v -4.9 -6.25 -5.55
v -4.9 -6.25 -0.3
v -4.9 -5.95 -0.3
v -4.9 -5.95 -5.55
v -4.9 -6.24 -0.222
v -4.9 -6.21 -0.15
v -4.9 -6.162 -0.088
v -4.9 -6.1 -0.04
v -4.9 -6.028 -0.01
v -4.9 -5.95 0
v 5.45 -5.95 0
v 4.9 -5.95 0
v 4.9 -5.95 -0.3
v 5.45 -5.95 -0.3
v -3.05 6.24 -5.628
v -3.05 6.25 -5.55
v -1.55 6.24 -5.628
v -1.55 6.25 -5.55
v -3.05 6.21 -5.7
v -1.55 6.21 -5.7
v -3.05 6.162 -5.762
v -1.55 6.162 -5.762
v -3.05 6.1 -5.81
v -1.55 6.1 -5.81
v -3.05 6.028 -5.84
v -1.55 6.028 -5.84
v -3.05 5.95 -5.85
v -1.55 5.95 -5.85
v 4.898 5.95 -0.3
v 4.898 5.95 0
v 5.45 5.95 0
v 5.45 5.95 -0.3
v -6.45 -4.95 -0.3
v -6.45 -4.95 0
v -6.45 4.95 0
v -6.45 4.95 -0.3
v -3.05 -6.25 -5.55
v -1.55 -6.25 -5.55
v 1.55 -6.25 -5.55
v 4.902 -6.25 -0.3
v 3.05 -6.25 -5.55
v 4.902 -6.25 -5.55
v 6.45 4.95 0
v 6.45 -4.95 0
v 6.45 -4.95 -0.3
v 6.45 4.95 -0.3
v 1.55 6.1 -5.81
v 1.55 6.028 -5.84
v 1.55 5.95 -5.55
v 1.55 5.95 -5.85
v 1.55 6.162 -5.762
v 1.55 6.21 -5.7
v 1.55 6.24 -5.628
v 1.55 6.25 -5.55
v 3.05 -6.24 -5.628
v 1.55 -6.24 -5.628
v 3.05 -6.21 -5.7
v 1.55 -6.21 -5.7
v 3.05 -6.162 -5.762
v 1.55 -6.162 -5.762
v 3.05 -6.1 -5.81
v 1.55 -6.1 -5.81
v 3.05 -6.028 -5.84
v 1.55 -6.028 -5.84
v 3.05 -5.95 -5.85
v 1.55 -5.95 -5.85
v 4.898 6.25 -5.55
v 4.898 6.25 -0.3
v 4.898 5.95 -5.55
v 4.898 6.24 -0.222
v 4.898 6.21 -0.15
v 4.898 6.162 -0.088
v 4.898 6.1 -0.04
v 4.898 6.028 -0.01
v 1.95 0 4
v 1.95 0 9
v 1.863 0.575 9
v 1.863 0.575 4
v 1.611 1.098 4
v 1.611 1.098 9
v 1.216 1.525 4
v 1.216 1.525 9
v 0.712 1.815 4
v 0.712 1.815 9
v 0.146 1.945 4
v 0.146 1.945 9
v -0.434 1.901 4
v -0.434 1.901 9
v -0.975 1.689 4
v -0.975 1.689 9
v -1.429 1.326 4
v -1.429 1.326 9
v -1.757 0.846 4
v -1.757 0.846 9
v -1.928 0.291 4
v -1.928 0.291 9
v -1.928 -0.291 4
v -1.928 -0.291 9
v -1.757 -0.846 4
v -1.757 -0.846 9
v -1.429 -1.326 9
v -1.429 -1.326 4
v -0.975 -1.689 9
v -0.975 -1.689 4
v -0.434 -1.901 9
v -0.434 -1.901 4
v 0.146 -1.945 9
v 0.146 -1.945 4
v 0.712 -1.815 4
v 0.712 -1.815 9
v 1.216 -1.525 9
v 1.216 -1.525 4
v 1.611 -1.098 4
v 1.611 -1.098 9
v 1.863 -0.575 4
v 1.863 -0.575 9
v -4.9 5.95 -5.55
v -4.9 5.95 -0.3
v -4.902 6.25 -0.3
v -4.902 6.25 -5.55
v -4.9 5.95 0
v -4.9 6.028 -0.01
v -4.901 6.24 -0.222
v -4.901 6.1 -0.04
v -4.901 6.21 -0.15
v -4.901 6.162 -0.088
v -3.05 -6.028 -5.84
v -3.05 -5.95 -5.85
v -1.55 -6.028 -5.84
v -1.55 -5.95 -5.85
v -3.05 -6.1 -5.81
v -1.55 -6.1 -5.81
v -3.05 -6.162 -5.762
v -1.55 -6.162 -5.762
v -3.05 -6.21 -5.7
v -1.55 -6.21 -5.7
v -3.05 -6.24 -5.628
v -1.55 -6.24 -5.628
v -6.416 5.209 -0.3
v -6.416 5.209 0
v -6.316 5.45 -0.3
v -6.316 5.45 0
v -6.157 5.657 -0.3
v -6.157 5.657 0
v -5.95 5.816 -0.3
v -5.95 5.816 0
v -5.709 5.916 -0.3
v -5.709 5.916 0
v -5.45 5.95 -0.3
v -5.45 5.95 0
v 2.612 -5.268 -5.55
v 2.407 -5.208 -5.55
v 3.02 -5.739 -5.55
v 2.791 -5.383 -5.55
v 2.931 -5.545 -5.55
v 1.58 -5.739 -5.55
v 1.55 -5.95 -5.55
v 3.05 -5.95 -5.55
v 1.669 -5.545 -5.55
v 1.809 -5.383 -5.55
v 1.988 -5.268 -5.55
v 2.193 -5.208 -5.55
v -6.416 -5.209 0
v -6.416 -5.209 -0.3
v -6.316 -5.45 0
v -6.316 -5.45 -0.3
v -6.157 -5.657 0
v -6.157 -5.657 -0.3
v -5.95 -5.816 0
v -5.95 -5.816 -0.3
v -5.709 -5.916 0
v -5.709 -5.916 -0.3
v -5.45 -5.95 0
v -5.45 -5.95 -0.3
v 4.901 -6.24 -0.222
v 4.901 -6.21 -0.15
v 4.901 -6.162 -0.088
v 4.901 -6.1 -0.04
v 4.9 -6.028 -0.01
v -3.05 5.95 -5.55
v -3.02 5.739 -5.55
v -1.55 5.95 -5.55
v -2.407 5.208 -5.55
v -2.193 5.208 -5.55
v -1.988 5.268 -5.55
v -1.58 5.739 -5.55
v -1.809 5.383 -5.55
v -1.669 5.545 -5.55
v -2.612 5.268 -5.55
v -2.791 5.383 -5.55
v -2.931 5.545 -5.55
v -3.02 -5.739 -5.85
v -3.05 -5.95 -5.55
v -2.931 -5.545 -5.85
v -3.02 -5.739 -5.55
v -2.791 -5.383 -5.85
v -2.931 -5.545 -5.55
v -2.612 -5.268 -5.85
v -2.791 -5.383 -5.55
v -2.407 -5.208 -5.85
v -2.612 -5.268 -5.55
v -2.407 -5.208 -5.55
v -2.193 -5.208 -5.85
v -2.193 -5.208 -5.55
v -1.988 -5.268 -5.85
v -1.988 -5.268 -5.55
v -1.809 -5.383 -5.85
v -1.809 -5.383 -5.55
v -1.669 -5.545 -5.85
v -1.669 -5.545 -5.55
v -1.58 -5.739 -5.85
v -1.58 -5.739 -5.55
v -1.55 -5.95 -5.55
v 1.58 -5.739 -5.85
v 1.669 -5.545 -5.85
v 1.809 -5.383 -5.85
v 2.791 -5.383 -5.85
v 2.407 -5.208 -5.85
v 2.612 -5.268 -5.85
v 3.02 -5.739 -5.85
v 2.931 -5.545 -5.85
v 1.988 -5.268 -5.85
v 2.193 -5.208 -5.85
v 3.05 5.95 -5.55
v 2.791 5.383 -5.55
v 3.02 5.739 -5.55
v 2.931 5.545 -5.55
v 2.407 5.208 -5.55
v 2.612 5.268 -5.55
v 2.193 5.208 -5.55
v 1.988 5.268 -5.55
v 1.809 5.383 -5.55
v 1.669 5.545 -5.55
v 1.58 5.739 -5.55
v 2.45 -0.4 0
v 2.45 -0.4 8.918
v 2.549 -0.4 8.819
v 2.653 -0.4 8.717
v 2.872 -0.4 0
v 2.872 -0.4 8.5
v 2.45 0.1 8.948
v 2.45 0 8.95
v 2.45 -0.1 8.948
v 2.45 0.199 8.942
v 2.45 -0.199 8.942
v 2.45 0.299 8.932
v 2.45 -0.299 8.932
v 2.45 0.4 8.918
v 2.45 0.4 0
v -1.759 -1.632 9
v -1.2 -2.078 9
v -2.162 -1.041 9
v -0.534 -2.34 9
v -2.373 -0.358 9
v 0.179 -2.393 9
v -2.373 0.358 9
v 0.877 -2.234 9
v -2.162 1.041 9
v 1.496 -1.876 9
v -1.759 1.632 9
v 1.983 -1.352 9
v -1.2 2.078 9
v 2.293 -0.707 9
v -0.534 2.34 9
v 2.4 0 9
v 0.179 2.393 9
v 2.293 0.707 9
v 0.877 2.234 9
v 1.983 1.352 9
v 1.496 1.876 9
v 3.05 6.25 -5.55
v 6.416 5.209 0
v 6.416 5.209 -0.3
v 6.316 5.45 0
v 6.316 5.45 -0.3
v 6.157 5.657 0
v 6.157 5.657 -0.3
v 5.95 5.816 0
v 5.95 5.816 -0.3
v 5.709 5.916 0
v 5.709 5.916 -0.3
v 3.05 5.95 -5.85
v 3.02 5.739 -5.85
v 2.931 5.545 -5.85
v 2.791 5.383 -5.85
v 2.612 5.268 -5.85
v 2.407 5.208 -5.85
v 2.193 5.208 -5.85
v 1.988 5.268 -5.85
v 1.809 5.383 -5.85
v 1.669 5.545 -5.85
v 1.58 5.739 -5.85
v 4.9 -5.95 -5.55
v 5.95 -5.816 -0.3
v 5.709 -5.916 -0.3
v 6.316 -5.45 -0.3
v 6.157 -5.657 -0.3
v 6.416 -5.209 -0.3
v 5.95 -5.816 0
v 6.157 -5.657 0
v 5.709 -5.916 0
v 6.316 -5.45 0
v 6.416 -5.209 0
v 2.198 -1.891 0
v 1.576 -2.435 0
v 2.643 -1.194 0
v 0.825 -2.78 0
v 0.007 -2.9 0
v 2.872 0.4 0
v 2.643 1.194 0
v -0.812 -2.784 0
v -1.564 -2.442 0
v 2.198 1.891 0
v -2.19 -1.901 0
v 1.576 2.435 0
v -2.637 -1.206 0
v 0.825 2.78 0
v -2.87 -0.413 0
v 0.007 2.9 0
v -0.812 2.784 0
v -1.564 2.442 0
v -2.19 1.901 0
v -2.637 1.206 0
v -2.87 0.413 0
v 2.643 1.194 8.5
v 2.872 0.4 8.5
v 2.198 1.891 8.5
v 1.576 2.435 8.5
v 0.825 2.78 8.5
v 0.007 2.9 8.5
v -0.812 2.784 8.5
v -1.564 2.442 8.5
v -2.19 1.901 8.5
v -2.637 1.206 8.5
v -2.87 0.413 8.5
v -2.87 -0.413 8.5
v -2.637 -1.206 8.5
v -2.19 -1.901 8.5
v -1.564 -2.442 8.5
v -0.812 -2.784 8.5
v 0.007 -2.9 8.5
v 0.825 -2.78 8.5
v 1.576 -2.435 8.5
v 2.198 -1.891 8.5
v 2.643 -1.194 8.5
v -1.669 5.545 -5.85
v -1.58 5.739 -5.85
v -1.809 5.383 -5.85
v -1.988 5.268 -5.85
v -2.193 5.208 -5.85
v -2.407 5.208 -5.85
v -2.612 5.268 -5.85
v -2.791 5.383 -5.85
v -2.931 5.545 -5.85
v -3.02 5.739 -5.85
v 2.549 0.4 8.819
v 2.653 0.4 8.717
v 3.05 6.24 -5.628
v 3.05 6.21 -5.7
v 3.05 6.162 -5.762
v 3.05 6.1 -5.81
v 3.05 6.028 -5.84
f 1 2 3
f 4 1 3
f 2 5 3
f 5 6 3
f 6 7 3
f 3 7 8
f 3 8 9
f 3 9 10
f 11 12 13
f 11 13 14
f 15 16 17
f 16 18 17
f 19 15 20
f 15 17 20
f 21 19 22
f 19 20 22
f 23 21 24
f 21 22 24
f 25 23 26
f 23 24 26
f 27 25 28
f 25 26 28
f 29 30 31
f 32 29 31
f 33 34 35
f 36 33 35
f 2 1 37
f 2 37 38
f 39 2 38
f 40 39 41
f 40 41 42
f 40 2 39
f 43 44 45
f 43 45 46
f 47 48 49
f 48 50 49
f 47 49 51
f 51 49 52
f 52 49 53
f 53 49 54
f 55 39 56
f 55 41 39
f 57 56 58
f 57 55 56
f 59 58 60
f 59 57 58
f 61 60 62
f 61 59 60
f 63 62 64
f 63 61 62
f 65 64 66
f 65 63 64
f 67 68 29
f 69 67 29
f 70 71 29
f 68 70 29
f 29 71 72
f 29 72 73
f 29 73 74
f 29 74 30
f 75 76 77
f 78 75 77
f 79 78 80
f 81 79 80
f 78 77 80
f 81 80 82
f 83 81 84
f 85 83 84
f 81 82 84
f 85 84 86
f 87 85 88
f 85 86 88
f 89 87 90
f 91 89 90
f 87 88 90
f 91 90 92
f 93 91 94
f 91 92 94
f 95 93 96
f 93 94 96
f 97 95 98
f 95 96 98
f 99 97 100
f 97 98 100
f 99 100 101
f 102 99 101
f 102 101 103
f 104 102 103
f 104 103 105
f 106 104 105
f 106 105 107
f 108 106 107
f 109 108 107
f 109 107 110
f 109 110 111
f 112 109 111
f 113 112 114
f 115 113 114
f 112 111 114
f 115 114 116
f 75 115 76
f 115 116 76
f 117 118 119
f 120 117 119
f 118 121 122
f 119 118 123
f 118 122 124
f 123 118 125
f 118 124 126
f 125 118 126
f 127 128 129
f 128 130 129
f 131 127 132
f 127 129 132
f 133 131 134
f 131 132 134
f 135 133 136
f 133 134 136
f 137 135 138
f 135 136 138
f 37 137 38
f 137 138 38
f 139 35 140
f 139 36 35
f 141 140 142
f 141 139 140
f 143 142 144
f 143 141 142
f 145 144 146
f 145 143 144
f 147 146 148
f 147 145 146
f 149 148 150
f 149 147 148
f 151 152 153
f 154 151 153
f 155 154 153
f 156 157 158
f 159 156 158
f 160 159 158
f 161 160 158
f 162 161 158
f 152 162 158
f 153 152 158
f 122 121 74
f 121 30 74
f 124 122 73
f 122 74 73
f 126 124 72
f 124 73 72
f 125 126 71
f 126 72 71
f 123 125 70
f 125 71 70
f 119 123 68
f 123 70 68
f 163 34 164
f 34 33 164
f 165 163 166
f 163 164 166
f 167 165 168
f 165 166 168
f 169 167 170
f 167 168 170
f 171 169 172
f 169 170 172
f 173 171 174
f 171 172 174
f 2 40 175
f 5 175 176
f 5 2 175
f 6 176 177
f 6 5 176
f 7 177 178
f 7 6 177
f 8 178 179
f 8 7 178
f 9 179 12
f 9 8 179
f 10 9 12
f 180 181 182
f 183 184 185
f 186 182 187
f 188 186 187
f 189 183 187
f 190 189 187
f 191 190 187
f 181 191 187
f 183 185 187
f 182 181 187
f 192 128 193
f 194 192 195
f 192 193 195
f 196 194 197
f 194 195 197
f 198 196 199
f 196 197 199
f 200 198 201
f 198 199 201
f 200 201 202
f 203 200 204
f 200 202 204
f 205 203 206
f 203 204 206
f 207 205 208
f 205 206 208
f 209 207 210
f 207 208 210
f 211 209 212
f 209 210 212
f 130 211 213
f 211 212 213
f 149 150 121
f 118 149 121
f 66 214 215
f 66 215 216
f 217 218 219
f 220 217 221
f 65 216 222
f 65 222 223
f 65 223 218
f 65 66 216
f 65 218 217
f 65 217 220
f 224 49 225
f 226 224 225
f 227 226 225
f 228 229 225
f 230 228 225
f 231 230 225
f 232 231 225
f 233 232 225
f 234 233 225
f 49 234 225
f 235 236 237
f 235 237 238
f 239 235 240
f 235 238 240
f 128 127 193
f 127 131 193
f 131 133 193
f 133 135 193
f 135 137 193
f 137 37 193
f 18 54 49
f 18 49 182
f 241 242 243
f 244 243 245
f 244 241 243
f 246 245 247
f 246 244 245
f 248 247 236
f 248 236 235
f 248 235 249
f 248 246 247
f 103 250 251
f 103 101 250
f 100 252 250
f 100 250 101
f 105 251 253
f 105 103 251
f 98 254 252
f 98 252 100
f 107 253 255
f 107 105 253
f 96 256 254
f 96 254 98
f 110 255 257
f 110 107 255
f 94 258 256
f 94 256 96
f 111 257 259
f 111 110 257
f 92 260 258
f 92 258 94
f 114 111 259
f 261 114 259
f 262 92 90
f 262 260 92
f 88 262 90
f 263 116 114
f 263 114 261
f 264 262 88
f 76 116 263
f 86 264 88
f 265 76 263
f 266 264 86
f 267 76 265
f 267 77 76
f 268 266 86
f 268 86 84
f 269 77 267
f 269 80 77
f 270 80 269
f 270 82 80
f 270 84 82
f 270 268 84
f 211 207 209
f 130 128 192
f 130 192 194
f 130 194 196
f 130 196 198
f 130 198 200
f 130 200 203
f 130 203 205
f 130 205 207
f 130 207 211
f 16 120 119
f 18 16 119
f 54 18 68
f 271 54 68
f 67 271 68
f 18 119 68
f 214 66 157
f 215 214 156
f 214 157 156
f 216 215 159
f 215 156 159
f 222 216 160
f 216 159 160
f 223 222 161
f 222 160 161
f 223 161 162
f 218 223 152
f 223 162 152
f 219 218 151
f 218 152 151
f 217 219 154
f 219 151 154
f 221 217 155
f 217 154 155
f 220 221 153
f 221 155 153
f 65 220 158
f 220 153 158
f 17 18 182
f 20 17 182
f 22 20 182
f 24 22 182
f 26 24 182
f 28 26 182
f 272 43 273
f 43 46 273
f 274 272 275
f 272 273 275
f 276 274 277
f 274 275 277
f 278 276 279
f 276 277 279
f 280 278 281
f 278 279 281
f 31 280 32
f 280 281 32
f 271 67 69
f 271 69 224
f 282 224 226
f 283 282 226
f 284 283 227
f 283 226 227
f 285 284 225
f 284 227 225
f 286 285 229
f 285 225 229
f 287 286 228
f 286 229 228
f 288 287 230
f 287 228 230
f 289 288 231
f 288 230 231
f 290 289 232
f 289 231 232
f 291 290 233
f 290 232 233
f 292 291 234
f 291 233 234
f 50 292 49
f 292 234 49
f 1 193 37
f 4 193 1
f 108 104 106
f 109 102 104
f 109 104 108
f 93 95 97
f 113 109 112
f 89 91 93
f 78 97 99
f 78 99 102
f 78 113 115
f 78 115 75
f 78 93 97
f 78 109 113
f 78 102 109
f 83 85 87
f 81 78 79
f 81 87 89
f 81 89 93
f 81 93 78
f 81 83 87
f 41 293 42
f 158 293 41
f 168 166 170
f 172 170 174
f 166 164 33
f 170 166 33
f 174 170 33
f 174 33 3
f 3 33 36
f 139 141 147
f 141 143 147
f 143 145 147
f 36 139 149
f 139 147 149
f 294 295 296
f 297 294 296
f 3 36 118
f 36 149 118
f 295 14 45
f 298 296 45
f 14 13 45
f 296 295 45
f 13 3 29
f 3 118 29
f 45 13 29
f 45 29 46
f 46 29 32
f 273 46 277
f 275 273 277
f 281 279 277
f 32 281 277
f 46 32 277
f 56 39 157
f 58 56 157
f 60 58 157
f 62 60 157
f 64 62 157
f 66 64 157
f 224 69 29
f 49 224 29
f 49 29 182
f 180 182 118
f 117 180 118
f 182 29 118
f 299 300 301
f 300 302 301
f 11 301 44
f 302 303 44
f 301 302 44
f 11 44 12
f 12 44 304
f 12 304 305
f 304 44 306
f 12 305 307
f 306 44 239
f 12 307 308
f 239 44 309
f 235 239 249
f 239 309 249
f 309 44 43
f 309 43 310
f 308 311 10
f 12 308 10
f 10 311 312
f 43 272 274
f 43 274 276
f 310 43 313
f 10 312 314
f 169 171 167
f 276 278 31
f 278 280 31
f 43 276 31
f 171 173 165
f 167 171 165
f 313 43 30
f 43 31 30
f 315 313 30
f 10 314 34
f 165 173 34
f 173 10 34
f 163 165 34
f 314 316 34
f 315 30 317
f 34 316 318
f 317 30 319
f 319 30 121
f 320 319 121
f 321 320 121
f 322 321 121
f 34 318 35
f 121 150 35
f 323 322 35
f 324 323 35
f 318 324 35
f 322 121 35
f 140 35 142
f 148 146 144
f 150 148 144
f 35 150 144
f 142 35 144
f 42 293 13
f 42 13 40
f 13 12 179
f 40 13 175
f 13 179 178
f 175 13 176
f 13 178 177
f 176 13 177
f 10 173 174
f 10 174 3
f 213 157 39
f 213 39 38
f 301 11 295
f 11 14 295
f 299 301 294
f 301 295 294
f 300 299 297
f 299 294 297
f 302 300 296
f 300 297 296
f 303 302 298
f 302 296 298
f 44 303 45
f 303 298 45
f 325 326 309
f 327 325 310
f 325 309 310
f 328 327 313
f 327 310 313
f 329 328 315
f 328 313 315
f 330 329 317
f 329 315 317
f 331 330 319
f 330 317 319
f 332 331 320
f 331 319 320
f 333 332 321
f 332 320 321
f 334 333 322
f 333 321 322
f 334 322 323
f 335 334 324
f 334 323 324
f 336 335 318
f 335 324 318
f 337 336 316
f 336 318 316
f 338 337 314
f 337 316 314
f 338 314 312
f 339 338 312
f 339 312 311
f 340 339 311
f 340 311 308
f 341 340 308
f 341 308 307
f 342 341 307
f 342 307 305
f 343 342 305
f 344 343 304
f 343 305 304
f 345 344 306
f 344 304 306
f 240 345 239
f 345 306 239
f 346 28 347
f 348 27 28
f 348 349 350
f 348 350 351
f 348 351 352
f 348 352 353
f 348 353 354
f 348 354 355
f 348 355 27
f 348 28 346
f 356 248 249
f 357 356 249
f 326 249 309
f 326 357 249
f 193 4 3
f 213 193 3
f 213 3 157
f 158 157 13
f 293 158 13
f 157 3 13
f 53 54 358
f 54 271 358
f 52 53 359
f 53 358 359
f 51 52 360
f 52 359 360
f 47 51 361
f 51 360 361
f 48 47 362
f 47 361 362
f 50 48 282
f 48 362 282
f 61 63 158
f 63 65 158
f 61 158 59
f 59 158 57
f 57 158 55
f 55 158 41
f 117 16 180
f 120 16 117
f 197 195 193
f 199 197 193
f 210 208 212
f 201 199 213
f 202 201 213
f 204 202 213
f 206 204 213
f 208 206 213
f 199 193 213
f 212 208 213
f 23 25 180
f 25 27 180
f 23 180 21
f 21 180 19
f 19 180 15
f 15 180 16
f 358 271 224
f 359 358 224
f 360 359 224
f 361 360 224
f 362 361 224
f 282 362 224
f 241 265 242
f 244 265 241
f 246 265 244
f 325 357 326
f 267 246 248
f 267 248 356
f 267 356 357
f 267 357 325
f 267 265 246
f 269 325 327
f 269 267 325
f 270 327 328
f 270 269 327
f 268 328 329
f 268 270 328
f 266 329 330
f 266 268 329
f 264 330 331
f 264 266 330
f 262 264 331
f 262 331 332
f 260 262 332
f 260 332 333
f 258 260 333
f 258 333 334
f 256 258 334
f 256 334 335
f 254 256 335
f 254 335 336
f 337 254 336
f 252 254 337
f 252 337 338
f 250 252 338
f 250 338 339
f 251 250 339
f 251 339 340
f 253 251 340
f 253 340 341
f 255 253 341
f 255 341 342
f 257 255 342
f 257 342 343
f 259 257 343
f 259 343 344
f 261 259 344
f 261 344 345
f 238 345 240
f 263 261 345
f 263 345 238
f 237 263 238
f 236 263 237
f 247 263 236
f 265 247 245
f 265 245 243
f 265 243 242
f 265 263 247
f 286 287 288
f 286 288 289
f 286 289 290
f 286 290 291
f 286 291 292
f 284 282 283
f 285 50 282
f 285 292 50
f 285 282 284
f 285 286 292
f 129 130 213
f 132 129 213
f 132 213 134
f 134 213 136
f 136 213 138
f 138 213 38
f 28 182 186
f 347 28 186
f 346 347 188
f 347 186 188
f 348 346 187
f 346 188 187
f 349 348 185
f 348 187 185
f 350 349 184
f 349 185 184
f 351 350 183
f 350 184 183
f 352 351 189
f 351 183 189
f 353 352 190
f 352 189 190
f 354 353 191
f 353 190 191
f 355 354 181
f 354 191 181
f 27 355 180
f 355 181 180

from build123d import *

# Parameters (mm, degrees)
SKETCH005_W     = 12.9
SKETCH005_H     = 11.9
PAD003_DEPTH    = 0.3
FILLET003_R     = 1
PAD004_DEPTH    = 5.55
PAD005_DEPTH    = 0.3
FILLET004_R     = 0.3
SKETCH008_R     = 2.9
PAD006_DEPTH    = 9
SKETCH009_R     = 1.95
POCKET002_DEPTH = 5
CHAMFER_SIZE    = 0.5
SKETCH010_W     = 0.5
SKETCH010_H     = 0.8
POCKET003_DEPTH = 9


with BuildPart() as part:
    # Sketch005 → Pad003 (new body)
    with BuildSketch(Plane.XY):
        Rectangle(SKETCH005_W, SKETCH005_H)
    extrude(amount=-PAD003_DEPTH)

    # Fillet003
    fillet003_edges = [part.edges().sort_by_distance(p)[0] for p in [
        (-6.45, -5.95, -0.15),
        (-6.45, 5.95, -0.15),
        (6.45, 5.95, -0.15),
        (6.45, -5.95, -0.15),
    ]]
    fillet(fillet003_edges, radius=FILLET003_R)

    # Sketch006 (on Face2 of Fillet003) → Pad004 (join)
    with BuildSketch(Plane.XY):
        Polygon((-4.901521, 6.25), (4.898479, 6.25), (4.898479, 5.95), (-4.9, 5.95), align=None)
        Polygon((4.901521, -6.25), (-4.9, -6.25), (-4.9, -5.949996), (4.9, -5.949996), align=None)
    extrude(amount=-PAD004_DEPTH)

    # Sketch007 (on Face21 of Pad004) → Pad005 (join)
    with BuildSketch(Plane(origin=(0, 0, -5.55), x_dir=(1, 0, 0), z_dir=(0, 0, -1))):
        with BuildLine():
            ThreePointArc((-3.05, 5.95), (-2.3, 5.2), (-1.55, 5.95))
            Line((-1.55, 5.95), (-1.55, 6.25))
            Line((-3.05, 6.25), (-1.55, 6.25))
            Line((-3.05, 6.25), (-3.05, 5.95))
        make_face()
        with BuildLine():
            ThreePointArc((1.55, 5.95), (2.3, 5.2), (3.05, 5.95))
            Line((3.05, 5.95), (3.05, 6.25))
            Line((1.55, 6.25), (3.05, 6.25))
            Line((1.55, 6.25), (1.55, 5.95))
        make_face()
        with BuildLine():
            ThreePointArc((-1.55, -5.95), (-2.3, -5.2), (-3.05, -5.95))
            Line((-3.05, -5.95), (-3.05, -6.25))
            Line((-3.05, -6.25), (-1.55, -6.25))
            Line((-1.55, -6.25), (-1.55, -5.95))
        make_face()
        with BuildLine():
            ThreePointArc((3.05, -5.95), (2.3, -5.2), (1.55, -5.95))
            Line((1.55, -5.95), (1.55, -6.25))
            Line((1.55, -6.25), (3.05, -6.25))
            Line((3.05, -6.25), (3.05, -5.95))
        make_face()
    extrude(amount=PAD005_DEPTH)

    # Fillet004
    fillet004_edges = [part.edges().sort_by_distance(p)[0] for p in [
        (2.3, -6.25, -5.85),
        (-2.3, -6.25, -5.85),
        (2.3, 6.25, -5.85),
        (-2.3, 6.25, -5.85),
        (-0.001521, 6.25, 0),
        (0.000761, -6.25, 0),
    ]]
    fillet(fillet004_edges, radius=FILLET004_R)

    # Sketch008 (on Face1 of Fillet004) → Pad006 (join)
    with BuildSketch(Plane.XY):
        Circle(SKETCH008_R)
    extrude(amount=PAD006_DEPTH)

    # Sketch009 (on Face22 of Pad006) → Pocket002 (cut)
    with BuildSketch(Plane.XY.offset(9)):
        Circle(SKETCH009_R)
    extrude(amount=-POCKET002_DEPTH, mode=Mode.SUBTRACT)

    # Chamfer
    chamfer_edges = [part.edges().sort_by_distance(p)[0] for p in [
        (-2.9, 0, 9),
    ]]
    chamfer(chamfer_edges, length=CHAMFER_SIZE)

    # Sketch010 (on Face4 of Chamfer) → Pocket003 (cut)
    with BuildSketch(Plane.XY.offset(9)):
        with Locations((2.7, 0)):
            Rectangle(SKETCH010_W, SKETCH010_H)
    extrude(amount=-POCKET003_DEPTH, mode=Mode.SUBTRACT)


solid = part.part
